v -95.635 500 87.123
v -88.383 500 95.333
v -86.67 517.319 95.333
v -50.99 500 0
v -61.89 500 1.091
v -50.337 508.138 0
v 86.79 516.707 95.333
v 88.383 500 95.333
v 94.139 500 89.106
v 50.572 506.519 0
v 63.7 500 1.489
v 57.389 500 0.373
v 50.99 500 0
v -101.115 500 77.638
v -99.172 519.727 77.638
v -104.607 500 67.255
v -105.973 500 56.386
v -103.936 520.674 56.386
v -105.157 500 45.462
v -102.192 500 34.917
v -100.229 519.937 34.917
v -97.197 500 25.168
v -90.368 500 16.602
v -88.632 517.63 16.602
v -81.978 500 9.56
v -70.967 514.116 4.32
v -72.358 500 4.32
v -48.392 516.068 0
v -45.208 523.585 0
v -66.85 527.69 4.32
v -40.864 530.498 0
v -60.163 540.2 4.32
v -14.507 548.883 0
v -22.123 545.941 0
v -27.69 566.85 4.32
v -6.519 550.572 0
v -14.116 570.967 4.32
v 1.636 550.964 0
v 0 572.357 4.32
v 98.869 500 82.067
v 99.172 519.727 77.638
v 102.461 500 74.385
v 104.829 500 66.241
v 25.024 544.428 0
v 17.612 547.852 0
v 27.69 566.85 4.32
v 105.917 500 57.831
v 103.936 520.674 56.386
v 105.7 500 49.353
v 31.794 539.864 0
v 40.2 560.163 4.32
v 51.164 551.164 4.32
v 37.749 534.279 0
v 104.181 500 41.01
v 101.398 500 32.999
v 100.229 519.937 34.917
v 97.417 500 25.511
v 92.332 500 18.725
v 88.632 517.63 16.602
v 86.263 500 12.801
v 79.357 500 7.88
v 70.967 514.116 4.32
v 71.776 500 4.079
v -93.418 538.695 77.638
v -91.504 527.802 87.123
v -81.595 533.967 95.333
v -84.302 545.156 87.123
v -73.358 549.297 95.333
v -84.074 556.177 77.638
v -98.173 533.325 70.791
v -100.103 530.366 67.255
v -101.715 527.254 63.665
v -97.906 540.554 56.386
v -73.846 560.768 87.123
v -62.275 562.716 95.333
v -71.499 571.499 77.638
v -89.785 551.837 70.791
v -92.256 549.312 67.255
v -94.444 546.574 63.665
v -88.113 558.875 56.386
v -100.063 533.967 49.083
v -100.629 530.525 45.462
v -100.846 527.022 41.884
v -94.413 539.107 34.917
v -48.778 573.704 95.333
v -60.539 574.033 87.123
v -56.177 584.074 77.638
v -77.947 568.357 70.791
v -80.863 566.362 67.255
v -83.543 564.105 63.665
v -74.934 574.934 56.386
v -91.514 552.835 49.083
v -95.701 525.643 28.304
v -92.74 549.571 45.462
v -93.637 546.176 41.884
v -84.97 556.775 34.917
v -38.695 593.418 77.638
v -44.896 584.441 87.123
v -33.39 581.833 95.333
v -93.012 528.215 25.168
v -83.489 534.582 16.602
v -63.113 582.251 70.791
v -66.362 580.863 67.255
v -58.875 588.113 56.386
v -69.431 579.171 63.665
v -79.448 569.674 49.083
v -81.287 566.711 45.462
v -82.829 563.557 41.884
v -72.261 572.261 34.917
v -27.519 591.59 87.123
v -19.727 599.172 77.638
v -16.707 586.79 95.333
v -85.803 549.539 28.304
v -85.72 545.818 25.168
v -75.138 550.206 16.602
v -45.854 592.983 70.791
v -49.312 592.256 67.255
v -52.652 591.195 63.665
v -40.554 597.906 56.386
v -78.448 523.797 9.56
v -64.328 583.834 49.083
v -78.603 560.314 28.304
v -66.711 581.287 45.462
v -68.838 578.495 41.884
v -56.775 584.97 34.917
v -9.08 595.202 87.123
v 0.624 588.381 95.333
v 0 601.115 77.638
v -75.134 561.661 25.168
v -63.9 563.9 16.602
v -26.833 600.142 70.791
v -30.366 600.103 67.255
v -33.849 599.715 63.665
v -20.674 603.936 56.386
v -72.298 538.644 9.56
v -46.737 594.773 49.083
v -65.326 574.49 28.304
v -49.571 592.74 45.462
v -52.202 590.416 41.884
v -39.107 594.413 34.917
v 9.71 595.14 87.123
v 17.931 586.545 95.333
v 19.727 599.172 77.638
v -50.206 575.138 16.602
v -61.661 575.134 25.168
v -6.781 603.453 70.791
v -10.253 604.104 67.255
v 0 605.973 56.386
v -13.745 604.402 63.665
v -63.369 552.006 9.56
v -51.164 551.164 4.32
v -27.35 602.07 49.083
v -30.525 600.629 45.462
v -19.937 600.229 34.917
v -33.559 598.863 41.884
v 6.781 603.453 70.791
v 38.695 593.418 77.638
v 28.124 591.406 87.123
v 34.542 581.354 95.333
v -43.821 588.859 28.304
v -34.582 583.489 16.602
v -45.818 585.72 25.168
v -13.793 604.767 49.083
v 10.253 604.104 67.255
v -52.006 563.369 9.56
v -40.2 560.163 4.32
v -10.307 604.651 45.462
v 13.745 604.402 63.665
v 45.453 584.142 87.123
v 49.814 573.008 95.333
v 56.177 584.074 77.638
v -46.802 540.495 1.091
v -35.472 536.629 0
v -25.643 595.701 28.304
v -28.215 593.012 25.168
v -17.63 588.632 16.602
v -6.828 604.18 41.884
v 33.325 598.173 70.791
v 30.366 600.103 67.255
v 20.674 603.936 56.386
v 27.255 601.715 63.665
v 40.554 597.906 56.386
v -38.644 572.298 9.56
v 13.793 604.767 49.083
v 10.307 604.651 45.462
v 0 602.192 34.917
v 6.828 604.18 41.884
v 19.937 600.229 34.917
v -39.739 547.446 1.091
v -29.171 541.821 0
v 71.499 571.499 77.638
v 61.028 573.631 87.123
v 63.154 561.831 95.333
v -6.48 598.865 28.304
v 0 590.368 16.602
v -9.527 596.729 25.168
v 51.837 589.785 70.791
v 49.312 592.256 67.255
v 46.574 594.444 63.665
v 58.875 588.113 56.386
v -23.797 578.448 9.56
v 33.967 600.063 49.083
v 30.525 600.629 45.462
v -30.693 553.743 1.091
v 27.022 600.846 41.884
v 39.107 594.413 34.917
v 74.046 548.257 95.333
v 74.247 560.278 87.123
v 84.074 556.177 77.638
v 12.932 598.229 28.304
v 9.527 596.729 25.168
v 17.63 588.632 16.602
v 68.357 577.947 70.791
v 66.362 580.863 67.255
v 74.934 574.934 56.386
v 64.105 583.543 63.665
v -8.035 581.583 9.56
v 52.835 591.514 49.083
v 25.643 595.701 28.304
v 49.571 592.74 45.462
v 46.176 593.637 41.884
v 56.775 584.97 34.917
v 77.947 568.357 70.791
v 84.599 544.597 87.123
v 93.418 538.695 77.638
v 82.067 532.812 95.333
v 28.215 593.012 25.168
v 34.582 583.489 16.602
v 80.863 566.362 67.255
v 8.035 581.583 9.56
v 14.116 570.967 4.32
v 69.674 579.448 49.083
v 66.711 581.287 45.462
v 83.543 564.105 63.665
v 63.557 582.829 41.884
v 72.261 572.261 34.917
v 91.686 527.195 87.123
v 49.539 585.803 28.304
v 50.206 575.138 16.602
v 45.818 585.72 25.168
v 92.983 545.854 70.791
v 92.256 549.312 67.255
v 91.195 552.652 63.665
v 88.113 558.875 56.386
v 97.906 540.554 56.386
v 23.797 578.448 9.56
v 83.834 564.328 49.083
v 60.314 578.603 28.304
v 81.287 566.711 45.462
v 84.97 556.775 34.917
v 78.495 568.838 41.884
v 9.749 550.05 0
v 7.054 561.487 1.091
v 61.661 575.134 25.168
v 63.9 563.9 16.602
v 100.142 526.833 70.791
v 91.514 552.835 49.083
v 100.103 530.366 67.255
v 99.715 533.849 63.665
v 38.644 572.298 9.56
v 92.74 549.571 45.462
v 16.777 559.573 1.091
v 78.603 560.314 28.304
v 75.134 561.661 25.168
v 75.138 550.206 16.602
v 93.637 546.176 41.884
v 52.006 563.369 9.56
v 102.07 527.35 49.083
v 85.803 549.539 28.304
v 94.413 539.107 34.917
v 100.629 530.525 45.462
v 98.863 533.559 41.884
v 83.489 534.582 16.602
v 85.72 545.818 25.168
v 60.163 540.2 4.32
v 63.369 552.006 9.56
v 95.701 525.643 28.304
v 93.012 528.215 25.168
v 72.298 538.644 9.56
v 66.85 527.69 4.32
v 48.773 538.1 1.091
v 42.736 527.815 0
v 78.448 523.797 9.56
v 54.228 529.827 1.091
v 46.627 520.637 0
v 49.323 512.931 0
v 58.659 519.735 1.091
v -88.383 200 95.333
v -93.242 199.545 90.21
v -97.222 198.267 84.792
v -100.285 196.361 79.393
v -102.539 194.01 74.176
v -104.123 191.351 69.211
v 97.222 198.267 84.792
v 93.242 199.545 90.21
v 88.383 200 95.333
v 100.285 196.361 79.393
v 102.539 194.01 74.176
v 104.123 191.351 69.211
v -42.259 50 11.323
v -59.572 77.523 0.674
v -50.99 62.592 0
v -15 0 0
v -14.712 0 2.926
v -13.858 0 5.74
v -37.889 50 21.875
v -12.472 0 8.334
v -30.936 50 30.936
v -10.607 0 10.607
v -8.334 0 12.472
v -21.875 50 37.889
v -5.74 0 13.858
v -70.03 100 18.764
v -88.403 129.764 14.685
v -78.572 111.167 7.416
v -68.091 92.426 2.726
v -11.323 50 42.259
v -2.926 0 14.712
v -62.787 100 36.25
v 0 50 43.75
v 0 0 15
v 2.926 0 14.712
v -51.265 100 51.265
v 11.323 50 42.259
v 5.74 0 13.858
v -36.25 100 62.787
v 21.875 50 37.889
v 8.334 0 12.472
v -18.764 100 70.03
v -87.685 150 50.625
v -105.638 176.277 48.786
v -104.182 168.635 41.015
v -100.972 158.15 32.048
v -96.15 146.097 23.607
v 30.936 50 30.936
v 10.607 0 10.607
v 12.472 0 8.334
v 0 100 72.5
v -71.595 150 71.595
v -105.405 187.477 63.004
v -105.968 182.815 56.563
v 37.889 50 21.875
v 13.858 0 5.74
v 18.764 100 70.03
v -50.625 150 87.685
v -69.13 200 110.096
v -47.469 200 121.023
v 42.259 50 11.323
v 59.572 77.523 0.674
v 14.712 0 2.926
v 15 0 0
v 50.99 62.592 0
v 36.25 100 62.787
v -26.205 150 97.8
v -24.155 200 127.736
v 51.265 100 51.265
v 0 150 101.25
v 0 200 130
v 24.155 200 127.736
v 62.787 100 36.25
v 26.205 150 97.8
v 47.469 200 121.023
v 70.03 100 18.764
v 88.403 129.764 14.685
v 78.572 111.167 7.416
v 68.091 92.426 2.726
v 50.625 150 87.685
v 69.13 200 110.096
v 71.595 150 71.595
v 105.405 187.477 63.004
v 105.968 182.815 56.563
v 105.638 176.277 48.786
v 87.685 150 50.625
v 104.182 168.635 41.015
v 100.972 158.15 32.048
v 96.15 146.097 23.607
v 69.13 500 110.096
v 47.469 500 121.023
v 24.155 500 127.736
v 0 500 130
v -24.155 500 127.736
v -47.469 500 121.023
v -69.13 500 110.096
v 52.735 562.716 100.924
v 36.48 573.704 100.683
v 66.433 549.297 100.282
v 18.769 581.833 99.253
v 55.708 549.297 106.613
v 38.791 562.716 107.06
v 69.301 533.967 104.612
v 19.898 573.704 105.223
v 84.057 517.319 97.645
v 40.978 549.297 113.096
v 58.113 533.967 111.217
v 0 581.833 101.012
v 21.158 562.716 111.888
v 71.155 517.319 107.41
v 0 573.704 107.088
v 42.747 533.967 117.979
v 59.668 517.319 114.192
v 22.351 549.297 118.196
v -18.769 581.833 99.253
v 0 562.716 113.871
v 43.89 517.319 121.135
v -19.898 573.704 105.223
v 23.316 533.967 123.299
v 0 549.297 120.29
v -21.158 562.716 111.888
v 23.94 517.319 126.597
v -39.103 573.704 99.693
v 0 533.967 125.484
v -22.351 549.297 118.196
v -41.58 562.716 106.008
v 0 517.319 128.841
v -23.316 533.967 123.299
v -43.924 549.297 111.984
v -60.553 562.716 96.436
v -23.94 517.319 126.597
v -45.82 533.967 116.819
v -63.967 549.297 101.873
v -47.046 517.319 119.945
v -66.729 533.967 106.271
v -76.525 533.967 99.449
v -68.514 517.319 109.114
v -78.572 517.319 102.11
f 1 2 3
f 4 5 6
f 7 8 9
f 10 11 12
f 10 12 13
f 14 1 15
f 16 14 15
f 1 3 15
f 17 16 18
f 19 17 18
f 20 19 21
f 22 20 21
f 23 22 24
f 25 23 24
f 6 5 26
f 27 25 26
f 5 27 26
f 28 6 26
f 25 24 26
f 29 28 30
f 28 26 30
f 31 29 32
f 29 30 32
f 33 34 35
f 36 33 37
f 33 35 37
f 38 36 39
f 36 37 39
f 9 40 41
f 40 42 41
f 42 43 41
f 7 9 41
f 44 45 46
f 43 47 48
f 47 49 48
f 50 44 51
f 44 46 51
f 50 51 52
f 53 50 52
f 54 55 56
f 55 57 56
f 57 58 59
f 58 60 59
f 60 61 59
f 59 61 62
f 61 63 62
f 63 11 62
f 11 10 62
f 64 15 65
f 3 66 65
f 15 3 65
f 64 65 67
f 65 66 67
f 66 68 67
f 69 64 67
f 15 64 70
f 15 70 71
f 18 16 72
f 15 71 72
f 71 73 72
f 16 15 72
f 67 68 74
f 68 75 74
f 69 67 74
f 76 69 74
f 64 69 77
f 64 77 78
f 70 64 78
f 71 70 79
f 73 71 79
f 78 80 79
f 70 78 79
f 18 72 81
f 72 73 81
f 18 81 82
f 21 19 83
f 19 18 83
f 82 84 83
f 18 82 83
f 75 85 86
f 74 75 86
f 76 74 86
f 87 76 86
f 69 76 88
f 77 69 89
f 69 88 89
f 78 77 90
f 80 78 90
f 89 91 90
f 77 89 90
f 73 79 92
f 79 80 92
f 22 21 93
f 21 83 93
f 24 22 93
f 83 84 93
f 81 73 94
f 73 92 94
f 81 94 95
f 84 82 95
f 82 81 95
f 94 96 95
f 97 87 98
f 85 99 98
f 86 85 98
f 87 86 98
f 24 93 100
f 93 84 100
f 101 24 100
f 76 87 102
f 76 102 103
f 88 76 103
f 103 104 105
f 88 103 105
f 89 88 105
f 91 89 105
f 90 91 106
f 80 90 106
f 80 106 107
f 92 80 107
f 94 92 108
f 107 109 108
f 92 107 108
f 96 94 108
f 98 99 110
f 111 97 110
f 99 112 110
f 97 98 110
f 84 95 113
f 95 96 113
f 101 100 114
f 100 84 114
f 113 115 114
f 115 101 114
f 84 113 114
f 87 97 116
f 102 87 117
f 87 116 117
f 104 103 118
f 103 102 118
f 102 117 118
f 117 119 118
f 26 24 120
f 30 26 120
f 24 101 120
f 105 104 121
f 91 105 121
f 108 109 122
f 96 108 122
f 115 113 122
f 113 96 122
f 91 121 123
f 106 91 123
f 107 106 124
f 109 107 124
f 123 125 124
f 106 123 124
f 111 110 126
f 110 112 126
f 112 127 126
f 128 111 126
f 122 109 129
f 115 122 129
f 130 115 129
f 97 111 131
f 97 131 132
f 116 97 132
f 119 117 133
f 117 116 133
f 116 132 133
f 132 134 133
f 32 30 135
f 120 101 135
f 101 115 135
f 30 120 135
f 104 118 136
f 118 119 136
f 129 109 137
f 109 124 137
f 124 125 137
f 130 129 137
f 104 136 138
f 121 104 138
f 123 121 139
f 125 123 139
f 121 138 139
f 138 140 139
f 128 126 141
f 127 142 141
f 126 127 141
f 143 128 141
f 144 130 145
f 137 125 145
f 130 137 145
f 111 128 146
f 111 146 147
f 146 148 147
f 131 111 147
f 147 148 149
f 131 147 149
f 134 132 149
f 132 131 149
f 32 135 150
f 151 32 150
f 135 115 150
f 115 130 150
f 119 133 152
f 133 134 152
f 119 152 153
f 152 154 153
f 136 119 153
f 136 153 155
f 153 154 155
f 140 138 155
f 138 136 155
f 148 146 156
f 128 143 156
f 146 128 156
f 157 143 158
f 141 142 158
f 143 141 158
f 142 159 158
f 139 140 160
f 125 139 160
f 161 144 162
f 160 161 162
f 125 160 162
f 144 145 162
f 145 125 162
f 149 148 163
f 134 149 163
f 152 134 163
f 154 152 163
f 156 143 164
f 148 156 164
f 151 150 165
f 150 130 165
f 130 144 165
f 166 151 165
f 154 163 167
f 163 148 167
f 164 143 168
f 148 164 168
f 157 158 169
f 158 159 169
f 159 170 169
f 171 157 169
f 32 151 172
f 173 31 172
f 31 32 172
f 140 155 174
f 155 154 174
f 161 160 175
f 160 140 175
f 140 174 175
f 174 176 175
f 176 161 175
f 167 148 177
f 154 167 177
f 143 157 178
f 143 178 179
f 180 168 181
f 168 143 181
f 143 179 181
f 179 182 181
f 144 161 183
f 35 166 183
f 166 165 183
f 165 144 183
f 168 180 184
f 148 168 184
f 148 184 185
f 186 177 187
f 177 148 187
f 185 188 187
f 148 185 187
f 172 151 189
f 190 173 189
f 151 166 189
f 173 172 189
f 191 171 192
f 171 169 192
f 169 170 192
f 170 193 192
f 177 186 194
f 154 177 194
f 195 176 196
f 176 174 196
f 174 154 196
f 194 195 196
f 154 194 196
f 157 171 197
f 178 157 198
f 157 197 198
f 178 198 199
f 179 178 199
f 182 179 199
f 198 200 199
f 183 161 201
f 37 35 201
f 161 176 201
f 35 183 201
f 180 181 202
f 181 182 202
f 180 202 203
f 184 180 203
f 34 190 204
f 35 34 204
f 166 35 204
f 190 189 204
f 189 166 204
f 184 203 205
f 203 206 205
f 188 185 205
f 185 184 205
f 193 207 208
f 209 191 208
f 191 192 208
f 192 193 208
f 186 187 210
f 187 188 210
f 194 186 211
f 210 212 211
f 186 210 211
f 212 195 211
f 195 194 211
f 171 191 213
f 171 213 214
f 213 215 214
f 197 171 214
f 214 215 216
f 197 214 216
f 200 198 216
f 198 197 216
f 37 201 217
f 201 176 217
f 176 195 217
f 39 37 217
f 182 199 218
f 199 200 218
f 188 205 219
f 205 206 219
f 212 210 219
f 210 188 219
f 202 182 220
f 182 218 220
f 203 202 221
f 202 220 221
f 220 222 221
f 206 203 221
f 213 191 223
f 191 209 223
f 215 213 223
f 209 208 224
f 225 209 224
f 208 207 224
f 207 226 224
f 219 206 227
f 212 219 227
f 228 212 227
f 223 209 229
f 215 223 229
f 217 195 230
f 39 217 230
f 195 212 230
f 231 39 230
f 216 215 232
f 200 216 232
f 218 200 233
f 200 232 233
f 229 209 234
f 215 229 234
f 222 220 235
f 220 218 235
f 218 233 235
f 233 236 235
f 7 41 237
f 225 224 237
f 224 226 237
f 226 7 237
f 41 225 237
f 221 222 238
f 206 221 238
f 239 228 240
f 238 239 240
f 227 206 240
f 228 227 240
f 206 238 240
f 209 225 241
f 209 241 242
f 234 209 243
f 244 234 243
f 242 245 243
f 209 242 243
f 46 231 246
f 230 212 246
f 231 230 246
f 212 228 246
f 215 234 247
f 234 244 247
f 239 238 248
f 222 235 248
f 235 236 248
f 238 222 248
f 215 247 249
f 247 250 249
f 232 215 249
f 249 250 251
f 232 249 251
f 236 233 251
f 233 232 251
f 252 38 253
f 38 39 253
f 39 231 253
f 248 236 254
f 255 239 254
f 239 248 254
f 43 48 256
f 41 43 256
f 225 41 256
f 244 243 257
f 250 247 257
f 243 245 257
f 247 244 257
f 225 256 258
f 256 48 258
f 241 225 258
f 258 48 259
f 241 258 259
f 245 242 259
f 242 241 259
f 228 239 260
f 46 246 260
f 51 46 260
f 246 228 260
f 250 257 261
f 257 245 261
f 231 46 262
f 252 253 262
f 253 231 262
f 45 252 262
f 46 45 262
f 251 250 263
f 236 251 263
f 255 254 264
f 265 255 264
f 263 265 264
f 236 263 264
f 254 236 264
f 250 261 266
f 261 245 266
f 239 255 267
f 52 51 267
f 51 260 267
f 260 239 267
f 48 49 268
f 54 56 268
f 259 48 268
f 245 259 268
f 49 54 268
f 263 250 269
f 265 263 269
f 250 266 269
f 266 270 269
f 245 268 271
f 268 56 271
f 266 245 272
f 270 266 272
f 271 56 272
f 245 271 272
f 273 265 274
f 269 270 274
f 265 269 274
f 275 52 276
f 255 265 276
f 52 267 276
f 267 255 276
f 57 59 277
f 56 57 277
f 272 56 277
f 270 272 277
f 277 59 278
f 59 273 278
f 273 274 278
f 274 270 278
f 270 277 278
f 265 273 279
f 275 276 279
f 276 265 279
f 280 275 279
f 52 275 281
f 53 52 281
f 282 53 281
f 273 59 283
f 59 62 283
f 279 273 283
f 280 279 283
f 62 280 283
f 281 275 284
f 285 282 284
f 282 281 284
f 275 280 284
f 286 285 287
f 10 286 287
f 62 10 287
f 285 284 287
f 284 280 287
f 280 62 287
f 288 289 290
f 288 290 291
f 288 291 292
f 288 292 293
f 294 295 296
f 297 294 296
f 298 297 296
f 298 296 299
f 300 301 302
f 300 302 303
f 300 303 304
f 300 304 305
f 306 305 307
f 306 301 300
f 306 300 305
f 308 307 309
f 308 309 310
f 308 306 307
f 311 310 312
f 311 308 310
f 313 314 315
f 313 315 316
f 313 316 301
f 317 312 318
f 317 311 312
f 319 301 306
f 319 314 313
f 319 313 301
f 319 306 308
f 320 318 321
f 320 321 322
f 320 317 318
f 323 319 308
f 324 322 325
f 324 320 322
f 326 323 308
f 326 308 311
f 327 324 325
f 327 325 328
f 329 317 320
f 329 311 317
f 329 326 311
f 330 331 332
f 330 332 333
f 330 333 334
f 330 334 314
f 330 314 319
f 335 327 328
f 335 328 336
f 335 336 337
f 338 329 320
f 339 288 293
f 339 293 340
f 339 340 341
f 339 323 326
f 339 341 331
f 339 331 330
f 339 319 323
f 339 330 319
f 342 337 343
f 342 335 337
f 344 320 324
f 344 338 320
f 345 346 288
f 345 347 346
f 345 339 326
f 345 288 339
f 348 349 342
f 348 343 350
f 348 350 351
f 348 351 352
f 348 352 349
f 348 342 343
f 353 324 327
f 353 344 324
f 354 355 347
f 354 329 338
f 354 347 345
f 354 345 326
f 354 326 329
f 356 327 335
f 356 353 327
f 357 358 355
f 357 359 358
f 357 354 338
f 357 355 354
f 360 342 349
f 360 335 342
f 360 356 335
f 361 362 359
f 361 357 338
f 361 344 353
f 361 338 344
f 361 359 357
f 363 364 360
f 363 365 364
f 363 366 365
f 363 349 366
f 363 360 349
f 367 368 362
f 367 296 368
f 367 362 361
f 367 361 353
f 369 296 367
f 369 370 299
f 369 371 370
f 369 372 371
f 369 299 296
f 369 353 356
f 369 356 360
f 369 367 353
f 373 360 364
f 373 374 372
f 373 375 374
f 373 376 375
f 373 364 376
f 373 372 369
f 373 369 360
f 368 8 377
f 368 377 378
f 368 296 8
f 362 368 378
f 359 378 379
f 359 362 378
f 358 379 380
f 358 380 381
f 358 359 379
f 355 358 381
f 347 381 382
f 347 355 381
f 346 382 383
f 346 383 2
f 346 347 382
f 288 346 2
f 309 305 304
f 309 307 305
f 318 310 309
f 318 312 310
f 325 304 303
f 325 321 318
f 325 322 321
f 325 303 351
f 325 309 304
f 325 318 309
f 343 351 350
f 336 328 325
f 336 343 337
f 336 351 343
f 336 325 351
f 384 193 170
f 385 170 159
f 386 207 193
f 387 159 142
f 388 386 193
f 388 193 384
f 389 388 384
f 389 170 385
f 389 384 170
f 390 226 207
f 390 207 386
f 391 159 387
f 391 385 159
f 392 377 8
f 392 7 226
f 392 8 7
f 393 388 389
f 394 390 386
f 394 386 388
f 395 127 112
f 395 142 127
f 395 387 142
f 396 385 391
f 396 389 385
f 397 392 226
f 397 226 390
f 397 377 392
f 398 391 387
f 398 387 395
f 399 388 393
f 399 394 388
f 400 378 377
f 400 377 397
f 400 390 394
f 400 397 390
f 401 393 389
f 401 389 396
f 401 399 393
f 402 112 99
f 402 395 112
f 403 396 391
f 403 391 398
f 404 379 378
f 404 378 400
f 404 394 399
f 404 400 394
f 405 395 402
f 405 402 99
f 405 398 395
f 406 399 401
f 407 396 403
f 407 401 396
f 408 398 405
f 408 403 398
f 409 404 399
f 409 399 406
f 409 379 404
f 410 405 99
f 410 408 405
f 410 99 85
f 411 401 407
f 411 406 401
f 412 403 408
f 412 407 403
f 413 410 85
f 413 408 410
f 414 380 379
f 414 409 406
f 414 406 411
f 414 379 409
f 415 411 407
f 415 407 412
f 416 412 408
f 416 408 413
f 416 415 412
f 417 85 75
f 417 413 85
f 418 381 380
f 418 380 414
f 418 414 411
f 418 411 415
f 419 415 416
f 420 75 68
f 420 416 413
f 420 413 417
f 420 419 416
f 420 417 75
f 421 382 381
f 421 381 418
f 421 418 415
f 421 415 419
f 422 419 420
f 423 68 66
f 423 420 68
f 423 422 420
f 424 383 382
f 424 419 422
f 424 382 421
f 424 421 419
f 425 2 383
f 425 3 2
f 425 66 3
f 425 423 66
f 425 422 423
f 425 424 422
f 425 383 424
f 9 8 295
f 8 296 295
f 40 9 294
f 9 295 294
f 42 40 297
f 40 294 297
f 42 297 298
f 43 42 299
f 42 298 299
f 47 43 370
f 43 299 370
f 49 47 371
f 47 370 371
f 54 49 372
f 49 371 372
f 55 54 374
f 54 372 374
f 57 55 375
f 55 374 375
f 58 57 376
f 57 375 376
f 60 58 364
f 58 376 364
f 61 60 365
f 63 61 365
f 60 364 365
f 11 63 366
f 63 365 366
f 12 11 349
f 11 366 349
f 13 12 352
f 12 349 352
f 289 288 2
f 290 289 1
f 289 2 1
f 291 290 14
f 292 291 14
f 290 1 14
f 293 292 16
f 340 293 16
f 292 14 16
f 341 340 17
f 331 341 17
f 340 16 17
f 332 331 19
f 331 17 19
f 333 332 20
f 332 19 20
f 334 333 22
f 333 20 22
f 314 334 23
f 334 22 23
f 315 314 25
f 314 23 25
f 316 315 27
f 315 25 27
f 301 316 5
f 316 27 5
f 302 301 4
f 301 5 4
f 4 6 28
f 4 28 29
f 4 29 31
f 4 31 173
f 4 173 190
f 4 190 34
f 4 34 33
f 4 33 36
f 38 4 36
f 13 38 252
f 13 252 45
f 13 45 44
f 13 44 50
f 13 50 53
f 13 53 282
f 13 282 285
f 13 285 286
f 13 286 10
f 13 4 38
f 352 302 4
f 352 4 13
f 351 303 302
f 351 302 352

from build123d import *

# Parameters (mm, degrees)
CYLINDER_W     = 130
CYLINDER_H     = 300
CYLINDER_ANGLE = 180
SPHERE_ANGLE   = 180
CONE_ANGLE     = 180
FILLET_R       = 55


with BuildPart() as cylinder:
    # Cylinder → Cylinder (revolve)
    with BuildSketch(Plane(origin=(0, 500, 0), x_dir=(1, 0, 0), z_dir=(0, 0, -1))):
        with Locations((65, 150)):
            Rectangle(CYLINDER_W, CYLINDER_H)
    revolve(axis=Axis((0, 500, 0), (0, -1, 0)), revolution_arc=CYLINDER_ANGLE)


with BuildPart() as sphere:
    # Sphere → Sphere (revolve)
    with BuildSketch(Plane(origin=(0, 500, 0), x_dir=(1, 0, 0), z_dir=(0, 0, -1))):
        with BuildLine():
            ThreePointArc((0, -130), (91.923882, -91.923882), (130, 0))
            Line((130, 0), (0, 0))
            Line((0, 0), (0, -130))
        make_face()
    revolve(axis=Axis((0, 500, 0), (0, -1, 0)), revolution_arc=SPHERE_ANGLE)


with BuildPart() as fillet_body:
    # Cone → Cone (revolve)
    with BuildSketch(Plane(origin=(0, 0, 0), x_dir=(-1, 0, 0), z_dir=(0, 0, -1))):
        Polygon((0, 0), (15, 0), (130, 200), (0, 200), align=None)
    revolve(axis=Axis((0, 0, 0), (0, 1, 0)), revolution_arc=CONE_ANGLE)

    # Fusion: union Cylinder, Sphere
    add(cylinder.part)
    add(sphere.part)

    # Fillet
    fillet_edges = [fillet_body.edges().sort_by_distance(p)[0] for p in [
        (130, 350, 0),
    ]]
    fillet(fillet_edges, radius=FILLET_R)


solid = fillet_body.part
